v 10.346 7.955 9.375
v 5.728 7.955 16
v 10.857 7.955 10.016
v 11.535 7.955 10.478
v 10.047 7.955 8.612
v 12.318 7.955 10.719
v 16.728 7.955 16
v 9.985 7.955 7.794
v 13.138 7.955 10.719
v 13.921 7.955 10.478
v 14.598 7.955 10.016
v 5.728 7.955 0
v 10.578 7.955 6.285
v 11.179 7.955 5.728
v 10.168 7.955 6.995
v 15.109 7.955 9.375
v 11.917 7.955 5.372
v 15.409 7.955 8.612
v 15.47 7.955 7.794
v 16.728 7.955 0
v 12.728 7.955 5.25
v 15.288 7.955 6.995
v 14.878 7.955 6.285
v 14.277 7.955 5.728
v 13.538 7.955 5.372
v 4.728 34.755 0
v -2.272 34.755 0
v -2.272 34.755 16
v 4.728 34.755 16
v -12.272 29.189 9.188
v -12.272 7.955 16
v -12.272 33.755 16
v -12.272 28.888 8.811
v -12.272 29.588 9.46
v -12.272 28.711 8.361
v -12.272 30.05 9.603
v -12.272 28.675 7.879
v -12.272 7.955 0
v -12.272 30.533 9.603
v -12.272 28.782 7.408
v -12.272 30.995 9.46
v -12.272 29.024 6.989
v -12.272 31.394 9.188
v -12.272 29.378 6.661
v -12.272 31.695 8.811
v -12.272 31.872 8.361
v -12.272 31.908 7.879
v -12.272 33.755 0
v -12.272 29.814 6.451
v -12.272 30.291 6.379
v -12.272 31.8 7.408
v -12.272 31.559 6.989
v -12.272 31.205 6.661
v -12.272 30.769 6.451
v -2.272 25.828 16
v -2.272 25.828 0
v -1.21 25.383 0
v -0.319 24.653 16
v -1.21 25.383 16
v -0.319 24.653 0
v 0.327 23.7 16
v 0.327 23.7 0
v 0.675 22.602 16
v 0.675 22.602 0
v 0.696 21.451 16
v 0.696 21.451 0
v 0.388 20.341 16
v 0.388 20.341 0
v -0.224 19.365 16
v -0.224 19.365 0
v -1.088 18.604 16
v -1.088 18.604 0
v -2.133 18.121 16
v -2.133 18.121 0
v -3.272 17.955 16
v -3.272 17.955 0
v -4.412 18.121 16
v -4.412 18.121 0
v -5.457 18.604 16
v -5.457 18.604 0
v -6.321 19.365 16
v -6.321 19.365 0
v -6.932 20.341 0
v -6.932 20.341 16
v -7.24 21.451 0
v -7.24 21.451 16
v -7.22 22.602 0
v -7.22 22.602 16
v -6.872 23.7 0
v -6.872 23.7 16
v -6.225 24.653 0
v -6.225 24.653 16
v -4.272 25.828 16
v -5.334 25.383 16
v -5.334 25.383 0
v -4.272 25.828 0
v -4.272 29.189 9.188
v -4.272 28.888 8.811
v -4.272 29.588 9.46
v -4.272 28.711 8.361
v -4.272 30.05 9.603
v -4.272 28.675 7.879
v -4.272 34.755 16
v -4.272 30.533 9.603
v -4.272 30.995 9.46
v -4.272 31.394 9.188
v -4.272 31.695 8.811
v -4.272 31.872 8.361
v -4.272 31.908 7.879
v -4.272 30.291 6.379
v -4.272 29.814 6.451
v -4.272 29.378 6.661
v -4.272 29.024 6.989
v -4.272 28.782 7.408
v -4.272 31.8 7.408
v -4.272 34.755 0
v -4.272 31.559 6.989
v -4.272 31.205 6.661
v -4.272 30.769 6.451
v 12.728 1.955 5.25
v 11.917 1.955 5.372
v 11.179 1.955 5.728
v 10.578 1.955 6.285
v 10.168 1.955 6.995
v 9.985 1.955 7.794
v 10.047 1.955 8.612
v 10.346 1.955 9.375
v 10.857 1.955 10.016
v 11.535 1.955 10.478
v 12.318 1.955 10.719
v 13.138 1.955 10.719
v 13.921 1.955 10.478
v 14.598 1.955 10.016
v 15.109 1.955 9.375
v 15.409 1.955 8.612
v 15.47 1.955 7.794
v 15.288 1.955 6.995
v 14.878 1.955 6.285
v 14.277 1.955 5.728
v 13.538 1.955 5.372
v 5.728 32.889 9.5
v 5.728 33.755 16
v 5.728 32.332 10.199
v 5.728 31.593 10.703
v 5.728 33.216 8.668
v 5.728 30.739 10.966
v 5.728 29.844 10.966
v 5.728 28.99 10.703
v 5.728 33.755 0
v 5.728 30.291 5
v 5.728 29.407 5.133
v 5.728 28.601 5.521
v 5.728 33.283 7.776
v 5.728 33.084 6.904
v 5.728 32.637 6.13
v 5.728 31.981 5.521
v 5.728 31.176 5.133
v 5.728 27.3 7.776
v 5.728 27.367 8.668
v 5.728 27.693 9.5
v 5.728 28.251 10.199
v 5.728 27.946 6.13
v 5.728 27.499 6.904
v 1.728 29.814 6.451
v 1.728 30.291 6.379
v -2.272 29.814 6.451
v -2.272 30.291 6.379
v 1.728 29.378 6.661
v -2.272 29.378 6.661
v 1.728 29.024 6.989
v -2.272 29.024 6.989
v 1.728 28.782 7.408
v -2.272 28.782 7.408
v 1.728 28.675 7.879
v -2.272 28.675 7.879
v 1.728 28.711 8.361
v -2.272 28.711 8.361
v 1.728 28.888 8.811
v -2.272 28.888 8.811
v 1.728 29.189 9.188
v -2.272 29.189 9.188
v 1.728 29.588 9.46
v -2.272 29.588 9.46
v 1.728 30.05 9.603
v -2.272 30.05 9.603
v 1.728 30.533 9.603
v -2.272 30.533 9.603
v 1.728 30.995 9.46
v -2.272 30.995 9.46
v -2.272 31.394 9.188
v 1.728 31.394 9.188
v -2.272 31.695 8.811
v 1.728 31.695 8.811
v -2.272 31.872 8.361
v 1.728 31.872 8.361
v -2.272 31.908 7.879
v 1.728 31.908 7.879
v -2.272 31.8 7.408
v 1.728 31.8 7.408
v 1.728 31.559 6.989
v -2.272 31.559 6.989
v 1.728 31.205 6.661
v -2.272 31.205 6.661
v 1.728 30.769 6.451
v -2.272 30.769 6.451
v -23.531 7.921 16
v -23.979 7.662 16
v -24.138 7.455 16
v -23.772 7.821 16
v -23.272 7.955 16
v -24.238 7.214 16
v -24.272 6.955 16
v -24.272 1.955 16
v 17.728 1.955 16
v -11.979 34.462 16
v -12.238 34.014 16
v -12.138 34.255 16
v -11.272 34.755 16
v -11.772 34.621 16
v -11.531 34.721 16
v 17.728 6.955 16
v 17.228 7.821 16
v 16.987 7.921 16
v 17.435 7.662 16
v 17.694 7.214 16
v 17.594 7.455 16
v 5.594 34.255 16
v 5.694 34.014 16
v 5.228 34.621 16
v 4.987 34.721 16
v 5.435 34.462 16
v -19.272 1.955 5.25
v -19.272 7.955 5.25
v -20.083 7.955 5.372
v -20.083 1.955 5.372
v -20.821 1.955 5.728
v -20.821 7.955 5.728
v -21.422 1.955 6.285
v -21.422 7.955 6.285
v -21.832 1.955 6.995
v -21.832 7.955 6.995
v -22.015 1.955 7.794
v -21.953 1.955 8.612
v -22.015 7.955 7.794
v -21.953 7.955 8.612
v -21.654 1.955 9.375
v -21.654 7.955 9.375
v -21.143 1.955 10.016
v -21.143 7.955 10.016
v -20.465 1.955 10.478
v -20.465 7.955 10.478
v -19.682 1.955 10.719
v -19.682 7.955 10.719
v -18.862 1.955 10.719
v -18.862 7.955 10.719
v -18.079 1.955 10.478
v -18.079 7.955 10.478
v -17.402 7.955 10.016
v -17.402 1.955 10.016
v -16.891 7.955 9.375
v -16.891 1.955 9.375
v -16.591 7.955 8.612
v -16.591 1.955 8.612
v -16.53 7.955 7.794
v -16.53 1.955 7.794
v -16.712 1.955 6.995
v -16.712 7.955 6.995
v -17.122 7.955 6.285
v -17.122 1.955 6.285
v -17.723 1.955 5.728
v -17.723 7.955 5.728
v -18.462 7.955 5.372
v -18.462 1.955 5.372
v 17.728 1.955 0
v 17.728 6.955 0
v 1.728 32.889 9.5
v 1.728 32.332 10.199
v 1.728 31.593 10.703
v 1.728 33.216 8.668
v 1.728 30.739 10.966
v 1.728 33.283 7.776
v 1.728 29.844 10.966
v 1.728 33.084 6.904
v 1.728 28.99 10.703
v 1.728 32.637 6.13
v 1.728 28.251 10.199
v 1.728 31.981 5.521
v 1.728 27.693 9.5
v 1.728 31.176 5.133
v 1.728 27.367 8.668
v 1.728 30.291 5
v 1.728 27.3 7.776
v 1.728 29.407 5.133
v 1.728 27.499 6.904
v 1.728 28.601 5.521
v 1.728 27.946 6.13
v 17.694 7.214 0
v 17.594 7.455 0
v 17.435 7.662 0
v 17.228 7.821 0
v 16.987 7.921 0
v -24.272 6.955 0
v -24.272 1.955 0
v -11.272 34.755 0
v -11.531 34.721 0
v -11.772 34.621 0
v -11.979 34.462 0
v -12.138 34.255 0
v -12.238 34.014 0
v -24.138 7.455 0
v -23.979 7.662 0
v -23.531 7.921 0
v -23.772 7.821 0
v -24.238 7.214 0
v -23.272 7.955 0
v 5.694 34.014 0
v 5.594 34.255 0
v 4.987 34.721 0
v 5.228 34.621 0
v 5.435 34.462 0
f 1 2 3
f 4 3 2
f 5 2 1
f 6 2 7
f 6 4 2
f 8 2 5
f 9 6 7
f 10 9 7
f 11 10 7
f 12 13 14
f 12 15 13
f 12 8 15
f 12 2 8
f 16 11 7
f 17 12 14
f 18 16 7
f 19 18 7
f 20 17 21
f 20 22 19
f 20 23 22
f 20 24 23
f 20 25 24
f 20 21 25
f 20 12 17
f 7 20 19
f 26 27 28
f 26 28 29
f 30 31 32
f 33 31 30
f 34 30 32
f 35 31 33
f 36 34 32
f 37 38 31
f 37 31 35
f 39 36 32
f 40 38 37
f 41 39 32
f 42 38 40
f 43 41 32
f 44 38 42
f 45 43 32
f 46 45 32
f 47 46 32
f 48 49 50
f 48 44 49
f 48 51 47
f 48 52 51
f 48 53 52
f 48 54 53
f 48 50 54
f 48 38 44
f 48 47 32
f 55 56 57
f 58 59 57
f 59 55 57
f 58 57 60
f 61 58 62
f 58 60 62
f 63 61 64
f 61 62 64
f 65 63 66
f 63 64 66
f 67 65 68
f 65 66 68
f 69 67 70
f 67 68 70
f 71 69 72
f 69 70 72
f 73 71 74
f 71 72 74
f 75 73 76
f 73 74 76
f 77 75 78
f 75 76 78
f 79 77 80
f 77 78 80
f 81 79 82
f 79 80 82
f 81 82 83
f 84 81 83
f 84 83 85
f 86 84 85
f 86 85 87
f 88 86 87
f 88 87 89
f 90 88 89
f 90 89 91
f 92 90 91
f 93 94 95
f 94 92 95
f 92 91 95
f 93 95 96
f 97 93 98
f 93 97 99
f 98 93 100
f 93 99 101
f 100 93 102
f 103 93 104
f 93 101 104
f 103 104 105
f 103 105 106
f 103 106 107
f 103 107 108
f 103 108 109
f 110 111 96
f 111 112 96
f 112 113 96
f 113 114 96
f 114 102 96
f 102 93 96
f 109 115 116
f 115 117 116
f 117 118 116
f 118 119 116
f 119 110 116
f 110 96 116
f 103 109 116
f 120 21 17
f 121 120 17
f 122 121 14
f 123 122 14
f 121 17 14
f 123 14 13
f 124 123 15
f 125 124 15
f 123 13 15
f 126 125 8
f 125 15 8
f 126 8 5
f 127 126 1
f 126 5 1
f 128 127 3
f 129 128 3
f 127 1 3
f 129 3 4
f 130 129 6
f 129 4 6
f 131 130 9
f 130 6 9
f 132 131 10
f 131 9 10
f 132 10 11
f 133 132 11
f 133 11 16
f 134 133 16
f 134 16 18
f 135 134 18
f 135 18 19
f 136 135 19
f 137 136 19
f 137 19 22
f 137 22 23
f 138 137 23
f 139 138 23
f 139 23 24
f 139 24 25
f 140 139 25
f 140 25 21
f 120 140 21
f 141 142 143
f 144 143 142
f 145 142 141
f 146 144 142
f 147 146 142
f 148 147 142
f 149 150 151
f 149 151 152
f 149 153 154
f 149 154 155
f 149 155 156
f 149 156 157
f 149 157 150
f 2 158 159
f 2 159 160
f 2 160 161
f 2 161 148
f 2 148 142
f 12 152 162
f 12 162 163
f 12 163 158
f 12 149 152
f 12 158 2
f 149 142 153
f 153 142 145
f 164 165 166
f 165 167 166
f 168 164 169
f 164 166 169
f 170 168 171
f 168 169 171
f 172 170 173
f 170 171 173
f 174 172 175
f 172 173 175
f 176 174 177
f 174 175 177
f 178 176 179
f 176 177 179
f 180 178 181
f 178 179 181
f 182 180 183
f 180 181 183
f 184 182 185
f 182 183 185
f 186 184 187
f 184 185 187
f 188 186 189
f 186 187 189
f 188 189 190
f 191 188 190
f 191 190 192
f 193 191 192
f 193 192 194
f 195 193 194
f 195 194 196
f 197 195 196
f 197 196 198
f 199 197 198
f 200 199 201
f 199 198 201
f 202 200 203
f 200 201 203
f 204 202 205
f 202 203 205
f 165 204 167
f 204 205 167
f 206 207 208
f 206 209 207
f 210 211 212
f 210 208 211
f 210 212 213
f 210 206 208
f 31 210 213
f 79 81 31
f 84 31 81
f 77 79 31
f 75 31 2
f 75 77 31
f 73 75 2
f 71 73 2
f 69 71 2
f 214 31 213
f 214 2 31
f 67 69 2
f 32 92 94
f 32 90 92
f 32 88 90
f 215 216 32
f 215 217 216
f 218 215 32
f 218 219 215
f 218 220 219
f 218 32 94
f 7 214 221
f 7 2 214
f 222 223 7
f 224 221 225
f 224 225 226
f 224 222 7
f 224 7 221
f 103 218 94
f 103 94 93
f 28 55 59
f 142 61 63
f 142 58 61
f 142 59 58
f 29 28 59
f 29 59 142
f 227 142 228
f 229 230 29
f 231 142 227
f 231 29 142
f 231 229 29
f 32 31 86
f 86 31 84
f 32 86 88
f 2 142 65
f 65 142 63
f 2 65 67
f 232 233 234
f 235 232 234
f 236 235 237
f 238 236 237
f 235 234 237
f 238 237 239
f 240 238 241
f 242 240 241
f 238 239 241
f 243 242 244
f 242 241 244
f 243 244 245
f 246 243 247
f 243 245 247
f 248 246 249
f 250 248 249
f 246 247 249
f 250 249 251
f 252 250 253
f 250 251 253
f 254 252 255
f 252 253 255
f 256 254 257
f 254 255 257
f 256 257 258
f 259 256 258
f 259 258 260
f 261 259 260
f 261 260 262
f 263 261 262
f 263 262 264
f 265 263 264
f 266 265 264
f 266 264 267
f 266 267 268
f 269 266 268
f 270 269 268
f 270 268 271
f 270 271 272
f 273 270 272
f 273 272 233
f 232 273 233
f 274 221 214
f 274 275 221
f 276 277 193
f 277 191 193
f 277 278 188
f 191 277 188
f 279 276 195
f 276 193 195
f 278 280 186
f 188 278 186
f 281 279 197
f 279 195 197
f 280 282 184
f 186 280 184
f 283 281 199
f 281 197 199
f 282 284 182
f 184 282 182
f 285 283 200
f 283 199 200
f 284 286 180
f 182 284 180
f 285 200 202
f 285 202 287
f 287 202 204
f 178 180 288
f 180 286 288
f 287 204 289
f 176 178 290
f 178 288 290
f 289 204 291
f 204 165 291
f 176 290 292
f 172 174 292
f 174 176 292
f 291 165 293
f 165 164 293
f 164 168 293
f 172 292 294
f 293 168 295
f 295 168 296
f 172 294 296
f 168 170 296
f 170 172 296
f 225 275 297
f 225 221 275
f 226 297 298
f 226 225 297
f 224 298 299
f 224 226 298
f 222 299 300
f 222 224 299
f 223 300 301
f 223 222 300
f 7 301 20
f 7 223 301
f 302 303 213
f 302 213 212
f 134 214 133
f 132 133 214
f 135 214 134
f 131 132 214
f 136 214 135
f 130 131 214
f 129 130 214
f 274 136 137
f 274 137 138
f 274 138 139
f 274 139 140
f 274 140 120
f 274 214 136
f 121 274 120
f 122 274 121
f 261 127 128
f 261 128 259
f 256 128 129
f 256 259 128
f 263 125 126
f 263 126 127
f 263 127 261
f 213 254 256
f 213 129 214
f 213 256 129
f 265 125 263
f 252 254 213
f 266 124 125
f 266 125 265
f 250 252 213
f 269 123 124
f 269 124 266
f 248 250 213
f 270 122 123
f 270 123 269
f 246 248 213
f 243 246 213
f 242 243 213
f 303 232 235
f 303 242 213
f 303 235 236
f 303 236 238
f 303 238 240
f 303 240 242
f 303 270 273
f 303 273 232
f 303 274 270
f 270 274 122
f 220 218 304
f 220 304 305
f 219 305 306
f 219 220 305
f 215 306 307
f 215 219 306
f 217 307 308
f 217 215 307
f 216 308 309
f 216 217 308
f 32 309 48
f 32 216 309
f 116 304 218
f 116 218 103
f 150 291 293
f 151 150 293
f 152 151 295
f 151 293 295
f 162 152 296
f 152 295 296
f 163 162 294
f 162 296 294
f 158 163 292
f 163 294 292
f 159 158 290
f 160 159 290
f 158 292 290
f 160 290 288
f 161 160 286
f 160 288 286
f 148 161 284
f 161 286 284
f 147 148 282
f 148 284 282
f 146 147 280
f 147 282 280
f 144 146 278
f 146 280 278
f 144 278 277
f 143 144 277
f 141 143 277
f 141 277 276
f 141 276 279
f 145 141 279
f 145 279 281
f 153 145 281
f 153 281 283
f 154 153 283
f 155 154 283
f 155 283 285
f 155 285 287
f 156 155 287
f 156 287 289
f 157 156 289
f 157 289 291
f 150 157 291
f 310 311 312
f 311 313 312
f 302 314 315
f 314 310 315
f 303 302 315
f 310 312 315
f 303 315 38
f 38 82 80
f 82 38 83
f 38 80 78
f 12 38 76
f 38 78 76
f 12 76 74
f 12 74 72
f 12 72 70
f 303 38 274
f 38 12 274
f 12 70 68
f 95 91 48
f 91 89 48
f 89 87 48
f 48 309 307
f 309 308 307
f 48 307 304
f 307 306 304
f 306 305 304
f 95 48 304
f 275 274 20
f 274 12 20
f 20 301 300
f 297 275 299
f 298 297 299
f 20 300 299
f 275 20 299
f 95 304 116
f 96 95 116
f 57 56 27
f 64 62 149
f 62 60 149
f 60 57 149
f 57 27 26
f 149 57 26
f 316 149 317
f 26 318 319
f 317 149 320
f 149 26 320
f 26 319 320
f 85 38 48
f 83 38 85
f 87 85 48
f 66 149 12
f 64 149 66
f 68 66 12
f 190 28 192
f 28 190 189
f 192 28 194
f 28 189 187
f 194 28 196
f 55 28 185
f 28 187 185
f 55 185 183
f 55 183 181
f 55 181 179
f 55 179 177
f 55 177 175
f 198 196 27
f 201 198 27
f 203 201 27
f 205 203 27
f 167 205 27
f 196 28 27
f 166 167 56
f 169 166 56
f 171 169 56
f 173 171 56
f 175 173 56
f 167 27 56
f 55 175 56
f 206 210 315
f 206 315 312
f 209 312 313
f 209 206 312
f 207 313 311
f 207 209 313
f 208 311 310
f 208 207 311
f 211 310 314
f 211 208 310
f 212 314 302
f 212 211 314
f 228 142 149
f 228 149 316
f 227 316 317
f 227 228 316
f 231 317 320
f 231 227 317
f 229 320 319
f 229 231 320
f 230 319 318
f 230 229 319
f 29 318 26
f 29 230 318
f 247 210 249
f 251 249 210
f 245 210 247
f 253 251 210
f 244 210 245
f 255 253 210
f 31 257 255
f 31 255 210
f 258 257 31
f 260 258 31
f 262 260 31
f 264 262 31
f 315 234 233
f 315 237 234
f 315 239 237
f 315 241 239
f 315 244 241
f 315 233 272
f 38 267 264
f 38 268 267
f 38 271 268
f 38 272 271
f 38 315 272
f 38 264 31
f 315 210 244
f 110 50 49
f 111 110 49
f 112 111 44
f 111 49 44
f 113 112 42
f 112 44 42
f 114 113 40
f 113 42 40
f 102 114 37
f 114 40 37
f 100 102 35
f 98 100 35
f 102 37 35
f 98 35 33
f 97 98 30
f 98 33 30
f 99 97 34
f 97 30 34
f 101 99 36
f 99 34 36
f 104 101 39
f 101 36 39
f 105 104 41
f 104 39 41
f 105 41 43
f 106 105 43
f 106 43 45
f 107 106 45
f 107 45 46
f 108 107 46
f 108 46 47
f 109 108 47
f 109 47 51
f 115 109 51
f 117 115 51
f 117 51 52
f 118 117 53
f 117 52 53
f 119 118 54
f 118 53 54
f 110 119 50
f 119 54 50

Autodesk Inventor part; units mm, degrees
ref_plane "YZ Plane" through (0, 0, 0) normal (1, 0, 0) x (0, 1, 0)
ref_plane "XZ Plane" through (0, 0, 0) normal (0, 1, 0) x (-1, 0, 0)
ref_plane "XY Plane" through (0, 0, 0) normal (0, 0, 1) x (1, 0, 0)
sketch "Esboço1" plane through (0, 0, 0) normal (0, 0, 1) x (1, 0, 0)
  line L0 (17.7277, 1.9549) -> (-24.2723, 1.9549)
  line L1 (-24.2723, 1.9549) -> (-24.2723, 7.9549)
  line L2 (17.7277, 7.9549) -> (17.7277, 1.9549)
  line L3 (5.7277, 34.7549) -> (5.7277, 7.9549)
  line L4 (-12.2723, 7.9549) -> (-12.2723, 34.7549)
  arc A0 (-4.2723, 25.8279) -> (-2.2723, 25.8279) centre (-3.2723, 21.9549) ccw
  line L5 (-24.2723, 7.9549) -> (-12.2723, 7.9549)
  line L6 (5.7277, 7.9549) -> (17.7277, 7.9549)
  line L7 (-2.2723, 34.7549) -> (-2.2723, 25.8279)
  line L8 (-4.2723, 25.8279) -> (-4.2723, 34.7549)
  line L9 (-12.2723, 34.7549) -> (-4.2723, 34.7549)
  line L10 (-2.2723, 34.7549) -> (5.7277, 34.7549)
  dimension "largura" = 42
  dimension "largura_topo" = 18
  dimension "altura_base" = 6
  dimension "diametro" = 8
  dimension "altura_furo" = 20
  dimension "d6" = 12
  dimension "d7" = 9
  dimension "d8" = 6
  dimension "d10" = 8
  dimension "d11" = 8
  dimension "altura" = 32.8
  dimension "d33" = 32.8
extrude "Extrusão1" add sketch "Esboço1" along normal blind 16
sketch "Esboço2" plane through (5.7277, 7.9549, 0) normal (1, 0, 0) x (0, 0, -1)
  line L0 (0, 17.873) -> (-16, 17.873) projected
  line L1 (-8, 17.873) -> (-8, 26.8) construction
  circle A0 centre (-8, 22.3365) radius 1.1711 construction
  line L2 (0, 26.8) -> (-16, 26.8) projected
  point P0 (0, -7.9549)
hole "Furo1" at (5.7277, 30.2914, 8) direction (-1, 0, 0) diameter 3.242 end through all counterbore diameter 6 counterbore depth 4 thread size "M4x0.7" class "6H" standard "ANSI Metric M Profile"
sketch "Esboço3" plane through (-24.2723, 1.9549, 0) normal (0, -1, 0) x (1, 0, 0)
  line L0 (5, 8) -> (37, 8) construction
  circle A0 centre (5, 8) radius 1 construction
  circle A1 centre (37, 8) radius 1 construction
  line L1 (42, 0) -> (0, 0) construction
  line L2 (21, 0) -> (21, 16) construction
  line L3 (0, 16) -> (42, 16) construction
  point P0 (21, 8)
  dimension "distancia_parafusos" = 32
  dimension "d22" = 2
  dimension "d23" = 2
hole "Furo2" at (-19.2723, 1.9549, 8) at (12.7277, 1.9549, 8) direction (0, 1, 0) diameter 5.5 end through all
fillet "Arredondamento1" radius 1 4 edges at (5.7277, 34.7549, 8) (-12.2723, 34.7549, 8) (-24.2723, 7.9549, 8) (17.7277, 7.9549, 8)
equation "\"d6\" = -0.5 * largura_topo + 0.5 * largura"
equation "\"d7\" = 0.5 * largura_topo"
equation "\"d8\" = altura_base"
equation "\"d11\" = d10"
equation "\"d33\" = altura"
properties part number "Sk8"
